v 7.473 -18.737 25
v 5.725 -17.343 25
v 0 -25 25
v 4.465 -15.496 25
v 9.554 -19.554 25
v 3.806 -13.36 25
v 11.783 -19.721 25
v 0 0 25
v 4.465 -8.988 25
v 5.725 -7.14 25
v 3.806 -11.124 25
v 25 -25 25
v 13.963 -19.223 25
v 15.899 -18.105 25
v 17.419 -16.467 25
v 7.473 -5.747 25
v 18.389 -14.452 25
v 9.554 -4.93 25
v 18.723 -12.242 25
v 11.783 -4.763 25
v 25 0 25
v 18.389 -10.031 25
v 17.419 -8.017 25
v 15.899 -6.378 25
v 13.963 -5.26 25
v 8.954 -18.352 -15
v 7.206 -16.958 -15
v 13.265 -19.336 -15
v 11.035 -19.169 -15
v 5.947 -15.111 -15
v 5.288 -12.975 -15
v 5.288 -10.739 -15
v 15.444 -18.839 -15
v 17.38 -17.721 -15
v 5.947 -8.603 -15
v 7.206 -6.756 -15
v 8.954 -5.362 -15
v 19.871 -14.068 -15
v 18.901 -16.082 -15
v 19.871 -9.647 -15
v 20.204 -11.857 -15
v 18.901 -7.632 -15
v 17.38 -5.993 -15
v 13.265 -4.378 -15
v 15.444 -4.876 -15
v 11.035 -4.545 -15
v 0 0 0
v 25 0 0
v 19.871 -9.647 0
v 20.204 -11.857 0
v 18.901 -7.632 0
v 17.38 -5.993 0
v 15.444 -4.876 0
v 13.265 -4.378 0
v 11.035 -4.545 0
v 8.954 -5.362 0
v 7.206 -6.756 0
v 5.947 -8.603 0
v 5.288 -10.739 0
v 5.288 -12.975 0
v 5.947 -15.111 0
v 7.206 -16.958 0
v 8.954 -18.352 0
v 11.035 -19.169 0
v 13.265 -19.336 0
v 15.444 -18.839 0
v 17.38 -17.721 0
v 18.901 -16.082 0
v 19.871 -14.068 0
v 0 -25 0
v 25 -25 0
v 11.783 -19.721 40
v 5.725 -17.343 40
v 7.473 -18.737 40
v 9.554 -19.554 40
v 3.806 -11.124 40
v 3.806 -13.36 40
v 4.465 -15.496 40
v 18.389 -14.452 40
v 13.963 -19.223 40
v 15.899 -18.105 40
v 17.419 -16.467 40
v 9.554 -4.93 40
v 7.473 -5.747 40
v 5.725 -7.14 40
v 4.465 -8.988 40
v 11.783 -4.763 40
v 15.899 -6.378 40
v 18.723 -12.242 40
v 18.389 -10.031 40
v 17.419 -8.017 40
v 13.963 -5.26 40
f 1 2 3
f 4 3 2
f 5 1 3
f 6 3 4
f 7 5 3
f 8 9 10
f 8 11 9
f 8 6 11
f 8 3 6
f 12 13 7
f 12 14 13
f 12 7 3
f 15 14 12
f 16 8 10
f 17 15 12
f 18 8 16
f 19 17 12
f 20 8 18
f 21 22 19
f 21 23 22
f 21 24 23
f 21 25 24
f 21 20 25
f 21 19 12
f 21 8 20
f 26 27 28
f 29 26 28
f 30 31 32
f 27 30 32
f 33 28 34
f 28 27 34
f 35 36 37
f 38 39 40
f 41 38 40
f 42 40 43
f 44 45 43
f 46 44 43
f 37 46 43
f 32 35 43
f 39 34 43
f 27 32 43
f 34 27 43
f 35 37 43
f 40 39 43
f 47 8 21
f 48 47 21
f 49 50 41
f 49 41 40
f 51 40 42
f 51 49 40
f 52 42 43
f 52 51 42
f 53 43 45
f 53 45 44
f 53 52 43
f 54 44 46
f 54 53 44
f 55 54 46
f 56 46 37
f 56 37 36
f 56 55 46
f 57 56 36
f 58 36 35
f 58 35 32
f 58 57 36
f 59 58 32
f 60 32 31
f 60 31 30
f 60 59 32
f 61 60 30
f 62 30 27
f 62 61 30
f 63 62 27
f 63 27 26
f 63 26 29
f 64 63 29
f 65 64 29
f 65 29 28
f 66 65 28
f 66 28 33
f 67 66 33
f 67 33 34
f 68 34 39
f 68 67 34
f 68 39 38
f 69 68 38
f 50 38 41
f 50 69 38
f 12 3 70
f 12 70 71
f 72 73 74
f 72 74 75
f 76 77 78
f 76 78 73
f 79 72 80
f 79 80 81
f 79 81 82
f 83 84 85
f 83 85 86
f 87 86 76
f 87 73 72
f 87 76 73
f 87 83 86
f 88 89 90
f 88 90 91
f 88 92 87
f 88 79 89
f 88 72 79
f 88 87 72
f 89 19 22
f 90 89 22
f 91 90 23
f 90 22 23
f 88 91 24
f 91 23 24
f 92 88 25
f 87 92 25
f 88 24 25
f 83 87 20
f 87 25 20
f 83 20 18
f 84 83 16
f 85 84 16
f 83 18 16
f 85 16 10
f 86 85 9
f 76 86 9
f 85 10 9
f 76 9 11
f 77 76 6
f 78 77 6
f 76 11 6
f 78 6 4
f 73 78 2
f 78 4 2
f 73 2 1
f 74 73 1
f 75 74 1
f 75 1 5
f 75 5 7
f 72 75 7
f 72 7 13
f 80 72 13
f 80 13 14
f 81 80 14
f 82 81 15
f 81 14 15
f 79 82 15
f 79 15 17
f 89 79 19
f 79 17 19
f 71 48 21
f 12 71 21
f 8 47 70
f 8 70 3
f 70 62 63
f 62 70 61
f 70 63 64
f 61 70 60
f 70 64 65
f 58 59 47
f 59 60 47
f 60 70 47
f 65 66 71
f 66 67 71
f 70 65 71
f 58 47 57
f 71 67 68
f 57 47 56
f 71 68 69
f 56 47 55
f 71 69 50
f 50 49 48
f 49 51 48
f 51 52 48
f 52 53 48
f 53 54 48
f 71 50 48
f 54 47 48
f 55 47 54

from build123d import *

# Parameters (mm, degrees)
F0_W     = 25
F0_H     = 25
F1_DEPTH = 25
F2_R     = 7.5
F3_DEPTH = 15
F4_R     = 7.5
F5_DEPTH = 15


with BuildPart() as f1:
    # F0 (on Front) → F1 (new body)
    with BuildSketch(Plane.XZ):
        with Locations((12.5, 12.5)):
            Rectangle(F0_W, F0_H)
    extrude(amount=F1_DEPTH)

    # F2 (on Top) → F3 (join)
    with BuildSketch(Plane.XY):
        with Locations((12.704089, -11.857167)):
            Circle(F2_R)
    extrude(amount=-F3_DEPTH)

    # F4 (on face) → F5 (join)
    with BuildSketch(Plane.XY.offset(25)):
        with Locations((11.222606, -12.241699)):
            Circle(F4_R)
    extrude(amount=F5_DEPTH)


solid = f1.part
